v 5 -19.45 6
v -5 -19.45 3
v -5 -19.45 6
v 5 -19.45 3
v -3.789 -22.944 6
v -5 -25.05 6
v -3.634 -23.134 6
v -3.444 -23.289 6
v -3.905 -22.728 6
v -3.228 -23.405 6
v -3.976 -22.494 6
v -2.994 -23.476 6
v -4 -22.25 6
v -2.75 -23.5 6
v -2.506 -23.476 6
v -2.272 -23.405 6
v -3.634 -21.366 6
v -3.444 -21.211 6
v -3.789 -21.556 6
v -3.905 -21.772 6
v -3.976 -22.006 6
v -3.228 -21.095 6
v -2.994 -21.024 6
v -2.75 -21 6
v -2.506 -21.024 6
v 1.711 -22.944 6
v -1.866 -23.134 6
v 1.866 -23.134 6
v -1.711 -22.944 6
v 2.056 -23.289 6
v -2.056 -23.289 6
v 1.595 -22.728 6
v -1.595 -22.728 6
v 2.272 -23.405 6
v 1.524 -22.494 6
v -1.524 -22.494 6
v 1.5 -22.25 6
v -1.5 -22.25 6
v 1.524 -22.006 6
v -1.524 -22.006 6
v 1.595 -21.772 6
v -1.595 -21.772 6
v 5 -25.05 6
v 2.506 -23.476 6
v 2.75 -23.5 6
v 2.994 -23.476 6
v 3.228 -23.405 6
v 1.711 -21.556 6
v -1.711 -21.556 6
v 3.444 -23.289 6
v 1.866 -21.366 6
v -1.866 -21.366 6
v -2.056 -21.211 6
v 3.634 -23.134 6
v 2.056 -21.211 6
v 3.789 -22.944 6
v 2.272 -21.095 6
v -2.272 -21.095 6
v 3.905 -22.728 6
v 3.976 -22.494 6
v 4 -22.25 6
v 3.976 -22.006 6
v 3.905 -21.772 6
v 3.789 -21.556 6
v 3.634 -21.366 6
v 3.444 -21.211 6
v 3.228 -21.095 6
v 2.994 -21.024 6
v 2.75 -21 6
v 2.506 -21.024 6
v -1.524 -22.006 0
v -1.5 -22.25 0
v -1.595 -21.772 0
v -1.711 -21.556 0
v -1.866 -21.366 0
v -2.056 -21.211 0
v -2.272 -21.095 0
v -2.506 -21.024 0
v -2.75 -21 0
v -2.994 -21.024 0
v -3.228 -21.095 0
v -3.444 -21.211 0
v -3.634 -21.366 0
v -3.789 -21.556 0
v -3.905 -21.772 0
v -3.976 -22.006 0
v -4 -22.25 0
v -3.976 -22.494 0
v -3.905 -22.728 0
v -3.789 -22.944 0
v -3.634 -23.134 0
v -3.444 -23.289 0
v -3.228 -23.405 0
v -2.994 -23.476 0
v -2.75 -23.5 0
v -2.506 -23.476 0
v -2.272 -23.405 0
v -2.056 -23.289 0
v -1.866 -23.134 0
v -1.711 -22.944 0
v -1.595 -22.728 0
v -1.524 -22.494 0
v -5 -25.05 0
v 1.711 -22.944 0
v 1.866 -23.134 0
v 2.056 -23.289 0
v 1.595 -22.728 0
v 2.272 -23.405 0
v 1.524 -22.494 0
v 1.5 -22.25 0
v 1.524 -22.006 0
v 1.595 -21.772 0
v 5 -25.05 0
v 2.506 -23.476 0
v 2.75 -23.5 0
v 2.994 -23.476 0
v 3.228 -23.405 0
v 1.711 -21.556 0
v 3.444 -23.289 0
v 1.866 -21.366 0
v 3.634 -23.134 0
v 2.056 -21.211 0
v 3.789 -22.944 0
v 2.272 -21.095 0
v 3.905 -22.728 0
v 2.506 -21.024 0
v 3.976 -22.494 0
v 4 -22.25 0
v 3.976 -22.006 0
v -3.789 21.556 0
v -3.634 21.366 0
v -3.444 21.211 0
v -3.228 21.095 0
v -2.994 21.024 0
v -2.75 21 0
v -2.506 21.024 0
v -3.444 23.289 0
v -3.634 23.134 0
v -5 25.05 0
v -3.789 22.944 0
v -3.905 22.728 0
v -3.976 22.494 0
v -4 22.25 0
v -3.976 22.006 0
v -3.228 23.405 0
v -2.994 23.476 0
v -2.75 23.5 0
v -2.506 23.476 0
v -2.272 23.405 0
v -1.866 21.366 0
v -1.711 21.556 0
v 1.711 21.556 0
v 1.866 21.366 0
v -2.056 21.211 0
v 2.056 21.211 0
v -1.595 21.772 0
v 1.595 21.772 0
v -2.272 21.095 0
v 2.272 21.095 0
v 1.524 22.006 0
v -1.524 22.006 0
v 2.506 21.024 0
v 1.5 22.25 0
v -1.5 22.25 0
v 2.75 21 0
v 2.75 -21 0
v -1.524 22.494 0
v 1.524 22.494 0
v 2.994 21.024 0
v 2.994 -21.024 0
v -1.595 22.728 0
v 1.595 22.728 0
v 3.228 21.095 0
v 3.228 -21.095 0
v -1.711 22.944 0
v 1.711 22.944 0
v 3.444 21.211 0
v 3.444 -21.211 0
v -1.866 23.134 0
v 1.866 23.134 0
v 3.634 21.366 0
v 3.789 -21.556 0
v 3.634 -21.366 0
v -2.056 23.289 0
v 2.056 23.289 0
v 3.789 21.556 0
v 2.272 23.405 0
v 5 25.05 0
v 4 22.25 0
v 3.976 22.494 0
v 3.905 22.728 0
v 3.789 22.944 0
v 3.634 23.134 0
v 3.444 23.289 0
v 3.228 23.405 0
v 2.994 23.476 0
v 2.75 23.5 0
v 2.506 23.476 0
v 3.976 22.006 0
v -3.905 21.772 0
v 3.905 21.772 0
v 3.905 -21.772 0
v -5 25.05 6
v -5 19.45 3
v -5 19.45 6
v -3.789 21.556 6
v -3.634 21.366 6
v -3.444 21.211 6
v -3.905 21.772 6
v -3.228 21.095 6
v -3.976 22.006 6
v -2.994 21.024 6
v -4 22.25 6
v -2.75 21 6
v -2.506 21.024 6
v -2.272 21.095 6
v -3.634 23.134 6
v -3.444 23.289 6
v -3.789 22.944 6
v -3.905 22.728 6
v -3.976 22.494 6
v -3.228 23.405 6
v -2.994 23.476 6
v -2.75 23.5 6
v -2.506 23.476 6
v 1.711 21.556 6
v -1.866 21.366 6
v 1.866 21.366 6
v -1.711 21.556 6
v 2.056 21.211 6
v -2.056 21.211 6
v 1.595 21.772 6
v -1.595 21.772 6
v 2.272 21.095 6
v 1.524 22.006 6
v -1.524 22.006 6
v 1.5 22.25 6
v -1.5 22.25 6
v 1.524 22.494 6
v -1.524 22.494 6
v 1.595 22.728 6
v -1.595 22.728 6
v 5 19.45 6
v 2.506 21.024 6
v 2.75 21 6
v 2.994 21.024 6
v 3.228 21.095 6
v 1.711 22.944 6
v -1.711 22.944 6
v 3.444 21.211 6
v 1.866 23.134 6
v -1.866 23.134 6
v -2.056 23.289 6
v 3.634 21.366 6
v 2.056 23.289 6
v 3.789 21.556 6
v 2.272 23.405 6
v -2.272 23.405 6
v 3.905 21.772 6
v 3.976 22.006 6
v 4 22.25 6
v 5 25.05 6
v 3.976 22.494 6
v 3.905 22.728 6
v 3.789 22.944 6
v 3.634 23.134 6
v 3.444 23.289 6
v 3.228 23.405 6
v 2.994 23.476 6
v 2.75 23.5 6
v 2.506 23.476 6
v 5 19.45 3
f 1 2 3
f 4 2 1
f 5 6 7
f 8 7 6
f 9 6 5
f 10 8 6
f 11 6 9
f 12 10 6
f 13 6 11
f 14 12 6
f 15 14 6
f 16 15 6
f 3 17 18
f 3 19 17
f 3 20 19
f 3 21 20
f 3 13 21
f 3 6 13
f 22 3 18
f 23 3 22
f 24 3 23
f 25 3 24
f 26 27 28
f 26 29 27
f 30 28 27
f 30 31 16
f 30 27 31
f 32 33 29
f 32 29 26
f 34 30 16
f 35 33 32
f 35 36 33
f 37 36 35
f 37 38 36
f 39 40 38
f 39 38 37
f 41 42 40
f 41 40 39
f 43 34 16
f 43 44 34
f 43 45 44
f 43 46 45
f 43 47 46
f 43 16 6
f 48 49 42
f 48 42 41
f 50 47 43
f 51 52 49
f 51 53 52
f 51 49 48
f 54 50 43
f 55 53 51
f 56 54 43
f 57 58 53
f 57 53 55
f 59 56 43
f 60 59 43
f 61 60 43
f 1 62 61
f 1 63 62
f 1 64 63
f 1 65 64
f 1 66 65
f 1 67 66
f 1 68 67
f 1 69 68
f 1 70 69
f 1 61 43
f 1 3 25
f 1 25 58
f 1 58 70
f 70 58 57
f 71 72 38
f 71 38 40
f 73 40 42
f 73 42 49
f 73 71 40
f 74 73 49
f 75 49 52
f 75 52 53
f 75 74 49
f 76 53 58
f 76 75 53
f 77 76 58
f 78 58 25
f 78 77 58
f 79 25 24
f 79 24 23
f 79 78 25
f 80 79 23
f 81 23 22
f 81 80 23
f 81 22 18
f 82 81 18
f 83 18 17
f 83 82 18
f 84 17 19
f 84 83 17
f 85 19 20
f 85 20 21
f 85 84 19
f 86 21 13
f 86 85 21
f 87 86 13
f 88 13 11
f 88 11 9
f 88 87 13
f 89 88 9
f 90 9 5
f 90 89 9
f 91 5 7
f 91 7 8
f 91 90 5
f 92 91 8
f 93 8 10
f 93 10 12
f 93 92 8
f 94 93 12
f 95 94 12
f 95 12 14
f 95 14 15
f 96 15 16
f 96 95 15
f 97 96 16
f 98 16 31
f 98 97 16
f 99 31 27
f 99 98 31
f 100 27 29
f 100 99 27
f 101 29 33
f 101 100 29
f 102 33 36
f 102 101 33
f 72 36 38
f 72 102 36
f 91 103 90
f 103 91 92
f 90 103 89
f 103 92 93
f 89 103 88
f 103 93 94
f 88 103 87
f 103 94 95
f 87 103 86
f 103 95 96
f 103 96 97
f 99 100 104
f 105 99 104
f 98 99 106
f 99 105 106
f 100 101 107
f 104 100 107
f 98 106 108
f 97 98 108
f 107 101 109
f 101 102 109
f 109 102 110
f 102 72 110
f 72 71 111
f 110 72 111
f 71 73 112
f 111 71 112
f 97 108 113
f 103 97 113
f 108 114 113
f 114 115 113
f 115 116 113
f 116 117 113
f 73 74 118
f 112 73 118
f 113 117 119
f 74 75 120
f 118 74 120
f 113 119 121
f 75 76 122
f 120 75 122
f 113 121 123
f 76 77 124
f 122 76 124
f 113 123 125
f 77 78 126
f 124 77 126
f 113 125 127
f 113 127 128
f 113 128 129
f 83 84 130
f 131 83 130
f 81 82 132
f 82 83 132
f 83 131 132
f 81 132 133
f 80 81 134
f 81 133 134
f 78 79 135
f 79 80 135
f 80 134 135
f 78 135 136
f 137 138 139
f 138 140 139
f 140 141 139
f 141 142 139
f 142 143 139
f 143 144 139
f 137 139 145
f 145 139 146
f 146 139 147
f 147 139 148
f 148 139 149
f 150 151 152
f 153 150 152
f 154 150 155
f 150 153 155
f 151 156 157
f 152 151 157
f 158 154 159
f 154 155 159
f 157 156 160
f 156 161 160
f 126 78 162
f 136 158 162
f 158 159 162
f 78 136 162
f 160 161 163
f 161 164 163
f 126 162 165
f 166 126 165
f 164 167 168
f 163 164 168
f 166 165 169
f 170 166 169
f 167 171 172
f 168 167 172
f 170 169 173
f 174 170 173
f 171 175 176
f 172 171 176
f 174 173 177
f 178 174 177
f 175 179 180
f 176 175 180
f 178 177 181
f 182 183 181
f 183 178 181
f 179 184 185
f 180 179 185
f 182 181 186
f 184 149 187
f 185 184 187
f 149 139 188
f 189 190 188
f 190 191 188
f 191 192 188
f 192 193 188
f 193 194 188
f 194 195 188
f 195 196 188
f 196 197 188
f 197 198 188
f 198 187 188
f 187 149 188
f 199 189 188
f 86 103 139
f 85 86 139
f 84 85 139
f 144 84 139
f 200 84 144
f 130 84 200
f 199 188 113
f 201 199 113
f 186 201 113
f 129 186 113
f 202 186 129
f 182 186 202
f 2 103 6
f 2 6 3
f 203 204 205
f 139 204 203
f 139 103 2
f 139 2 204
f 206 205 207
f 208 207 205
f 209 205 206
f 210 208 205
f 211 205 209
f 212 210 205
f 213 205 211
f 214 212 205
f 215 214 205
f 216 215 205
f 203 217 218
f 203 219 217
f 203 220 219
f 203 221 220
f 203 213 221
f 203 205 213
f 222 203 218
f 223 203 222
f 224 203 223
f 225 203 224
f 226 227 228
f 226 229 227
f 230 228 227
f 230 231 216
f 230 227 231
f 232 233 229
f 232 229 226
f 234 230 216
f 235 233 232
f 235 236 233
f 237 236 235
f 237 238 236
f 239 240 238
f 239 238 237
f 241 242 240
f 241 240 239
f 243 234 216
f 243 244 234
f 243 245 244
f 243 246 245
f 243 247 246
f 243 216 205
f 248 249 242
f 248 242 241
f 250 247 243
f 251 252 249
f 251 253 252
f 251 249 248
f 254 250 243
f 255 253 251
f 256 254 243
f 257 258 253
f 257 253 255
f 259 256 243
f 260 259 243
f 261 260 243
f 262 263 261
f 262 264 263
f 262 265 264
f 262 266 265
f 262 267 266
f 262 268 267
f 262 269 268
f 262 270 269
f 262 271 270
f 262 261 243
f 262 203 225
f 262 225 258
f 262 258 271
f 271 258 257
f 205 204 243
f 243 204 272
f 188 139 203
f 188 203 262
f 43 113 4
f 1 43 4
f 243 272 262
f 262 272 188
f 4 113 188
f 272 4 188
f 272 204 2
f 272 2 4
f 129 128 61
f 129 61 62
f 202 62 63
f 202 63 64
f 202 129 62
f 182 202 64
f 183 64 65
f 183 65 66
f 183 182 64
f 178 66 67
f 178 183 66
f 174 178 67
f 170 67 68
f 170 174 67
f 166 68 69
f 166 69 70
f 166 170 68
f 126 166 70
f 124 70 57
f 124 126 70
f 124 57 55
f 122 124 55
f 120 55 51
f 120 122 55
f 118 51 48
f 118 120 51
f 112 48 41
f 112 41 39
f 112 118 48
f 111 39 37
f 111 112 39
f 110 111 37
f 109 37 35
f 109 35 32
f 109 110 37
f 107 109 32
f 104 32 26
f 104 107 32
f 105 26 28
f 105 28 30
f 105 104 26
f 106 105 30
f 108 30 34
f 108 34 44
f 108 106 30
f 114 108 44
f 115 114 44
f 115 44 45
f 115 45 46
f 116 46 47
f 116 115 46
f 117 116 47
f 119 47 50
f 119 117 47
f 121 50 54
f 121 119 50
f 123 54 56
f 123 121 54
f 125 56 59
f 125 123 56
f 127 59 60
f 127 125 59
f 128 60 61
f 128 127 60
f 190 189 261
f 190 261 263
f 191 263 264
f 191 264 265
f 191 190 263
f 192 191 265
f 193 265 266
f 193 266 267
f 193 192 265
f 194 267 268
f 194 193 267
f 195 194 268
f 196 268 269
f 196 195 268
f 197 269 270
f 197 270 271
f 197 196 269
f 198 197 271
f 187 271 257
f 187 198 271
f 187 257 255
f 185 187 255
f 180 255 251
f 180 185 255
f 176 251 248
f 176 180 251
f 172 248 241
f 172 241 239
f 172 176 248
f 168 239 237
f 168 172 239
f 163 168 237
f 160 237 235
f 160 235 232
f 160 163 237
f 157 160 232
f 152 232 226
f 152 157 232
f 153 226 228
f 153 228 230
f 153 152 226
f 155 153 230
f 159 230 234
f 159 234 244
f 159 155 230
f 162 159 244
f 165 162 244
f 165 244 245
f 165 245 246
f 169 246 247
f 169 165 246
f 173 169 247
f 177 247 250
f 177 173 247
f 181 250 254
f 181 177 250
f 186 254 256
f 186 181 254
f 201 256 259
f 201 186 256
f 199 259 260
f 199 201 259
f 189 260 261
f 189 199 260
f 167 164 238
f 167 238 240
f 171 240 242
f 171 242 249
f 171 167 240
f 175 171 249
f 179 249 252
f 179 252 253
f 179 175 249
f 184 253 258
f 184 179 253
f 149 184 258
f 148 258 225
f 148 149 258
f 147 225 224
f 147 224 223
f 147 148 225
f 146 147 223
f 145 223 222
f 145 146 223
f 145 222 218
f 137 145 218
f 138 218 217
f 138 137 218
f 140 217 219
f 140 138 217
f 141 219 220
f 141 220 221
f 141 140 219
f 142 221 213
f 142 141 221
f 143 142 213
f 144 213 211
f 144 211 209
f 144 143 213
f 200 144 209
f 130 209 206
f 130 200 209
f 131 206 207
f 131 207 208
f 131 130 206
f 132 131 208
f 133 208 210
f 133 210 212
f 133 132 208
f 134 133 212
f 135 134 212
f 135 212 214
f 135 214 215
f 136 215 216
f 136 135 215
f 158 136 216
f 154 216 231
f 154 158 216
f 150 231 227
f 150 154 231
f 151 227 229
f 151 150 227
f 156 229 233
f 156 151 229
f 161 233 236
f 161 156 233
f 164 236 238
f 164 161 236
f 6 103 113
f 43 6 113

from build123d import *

# Parameters (mm, degrees)
F0_W     = 10
F0_H     = 38.9
F1_DEPTH = 3
F0_H_2   = 5.6
F0_R     = 1.25
F2_DEPTH = 6


with BuildPart() as f1:
    # F0 (on Top) → F1 (new body)
    with BuildSketch(Plane.XY):
        Rectangle(F0_W, F0_H)
    extrude(amount=F1_DEPTH)

    # F0 (on Top) → F2 (join)
    with BuildSketch(Plane.XY):
        with Locations((0, 22.25)):
            Rectangle(F0_W, F0_H_2)
        with Locations((-2.75, 22.25)):
            Circle(F0_R, mode=Mode.SUBTRACT)
        with Locations((2.75, 22.25)):
            Circle(F0_R, mode=Mode.SUBTRACT)
        with Locations((0, -22.25)):
            Rectangle(F0_W, F0_H_2)
        with Locations((-2.75, -22.25)):
            Circle(F0_R, mode=Mode.SUBTRACT)
        with Locations((2.75, -22.25)):
            Circle(F0_R, mode=Mode.SUBTRACT)
    extrude(amount=F2_DEPTH)


solid = f1.part
